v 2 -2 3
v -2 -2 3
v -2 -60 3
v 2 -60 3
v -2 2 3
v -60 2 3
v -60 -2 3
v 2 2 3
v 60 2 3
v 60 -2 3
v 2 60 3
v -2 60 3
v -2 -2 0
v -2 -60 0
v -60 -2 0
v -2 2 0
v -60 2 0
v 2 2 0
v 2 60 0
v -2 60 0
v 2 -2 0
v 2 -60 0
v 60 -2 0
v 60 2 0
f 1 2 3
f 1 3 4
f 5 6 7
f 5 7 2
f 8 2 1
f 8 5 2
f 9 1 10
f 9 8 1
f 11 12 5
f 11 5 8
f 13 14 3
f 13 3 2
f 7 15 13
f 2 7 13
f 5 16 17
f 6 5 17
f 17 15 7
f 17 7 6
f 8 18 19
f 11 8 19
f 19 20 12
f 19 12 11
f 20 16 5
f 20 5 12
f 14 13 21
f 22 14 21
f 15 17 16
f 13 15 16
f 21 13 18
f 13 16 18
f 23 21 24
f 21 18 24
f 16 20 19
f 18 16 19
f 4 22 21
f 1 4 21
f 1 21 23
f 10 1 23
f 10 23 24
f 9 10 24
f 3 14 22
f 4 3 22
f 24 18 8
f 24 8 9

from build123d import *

# Parameters (mm, degrees)
F0_W     = 58
F0_H     = 4
F0_W_2   = 4
F0_H_2   = 58
F1_DEPTH = 3


with BuildPart() as f1:
    # F0 (on Top) → F1 (new body)
    with BuildSketch(Plane.XY):
        with Locations((-31, 0)):
            Rectangle(F0_W, F0_H)
        with Locations((0, -31)):
            Rectangle(F0_W_2, F0_H_2)
        Rectangle(F0_W_2, F0_H)
        with Locations((0, 31)):
            Rectangle(F0_W_2, F0_H_2)
        with Locations((31, 0)):
            Rectangle(F0_W, F0_H)
    extrude(amount=F1_DEPTH)


solid = f1.part
